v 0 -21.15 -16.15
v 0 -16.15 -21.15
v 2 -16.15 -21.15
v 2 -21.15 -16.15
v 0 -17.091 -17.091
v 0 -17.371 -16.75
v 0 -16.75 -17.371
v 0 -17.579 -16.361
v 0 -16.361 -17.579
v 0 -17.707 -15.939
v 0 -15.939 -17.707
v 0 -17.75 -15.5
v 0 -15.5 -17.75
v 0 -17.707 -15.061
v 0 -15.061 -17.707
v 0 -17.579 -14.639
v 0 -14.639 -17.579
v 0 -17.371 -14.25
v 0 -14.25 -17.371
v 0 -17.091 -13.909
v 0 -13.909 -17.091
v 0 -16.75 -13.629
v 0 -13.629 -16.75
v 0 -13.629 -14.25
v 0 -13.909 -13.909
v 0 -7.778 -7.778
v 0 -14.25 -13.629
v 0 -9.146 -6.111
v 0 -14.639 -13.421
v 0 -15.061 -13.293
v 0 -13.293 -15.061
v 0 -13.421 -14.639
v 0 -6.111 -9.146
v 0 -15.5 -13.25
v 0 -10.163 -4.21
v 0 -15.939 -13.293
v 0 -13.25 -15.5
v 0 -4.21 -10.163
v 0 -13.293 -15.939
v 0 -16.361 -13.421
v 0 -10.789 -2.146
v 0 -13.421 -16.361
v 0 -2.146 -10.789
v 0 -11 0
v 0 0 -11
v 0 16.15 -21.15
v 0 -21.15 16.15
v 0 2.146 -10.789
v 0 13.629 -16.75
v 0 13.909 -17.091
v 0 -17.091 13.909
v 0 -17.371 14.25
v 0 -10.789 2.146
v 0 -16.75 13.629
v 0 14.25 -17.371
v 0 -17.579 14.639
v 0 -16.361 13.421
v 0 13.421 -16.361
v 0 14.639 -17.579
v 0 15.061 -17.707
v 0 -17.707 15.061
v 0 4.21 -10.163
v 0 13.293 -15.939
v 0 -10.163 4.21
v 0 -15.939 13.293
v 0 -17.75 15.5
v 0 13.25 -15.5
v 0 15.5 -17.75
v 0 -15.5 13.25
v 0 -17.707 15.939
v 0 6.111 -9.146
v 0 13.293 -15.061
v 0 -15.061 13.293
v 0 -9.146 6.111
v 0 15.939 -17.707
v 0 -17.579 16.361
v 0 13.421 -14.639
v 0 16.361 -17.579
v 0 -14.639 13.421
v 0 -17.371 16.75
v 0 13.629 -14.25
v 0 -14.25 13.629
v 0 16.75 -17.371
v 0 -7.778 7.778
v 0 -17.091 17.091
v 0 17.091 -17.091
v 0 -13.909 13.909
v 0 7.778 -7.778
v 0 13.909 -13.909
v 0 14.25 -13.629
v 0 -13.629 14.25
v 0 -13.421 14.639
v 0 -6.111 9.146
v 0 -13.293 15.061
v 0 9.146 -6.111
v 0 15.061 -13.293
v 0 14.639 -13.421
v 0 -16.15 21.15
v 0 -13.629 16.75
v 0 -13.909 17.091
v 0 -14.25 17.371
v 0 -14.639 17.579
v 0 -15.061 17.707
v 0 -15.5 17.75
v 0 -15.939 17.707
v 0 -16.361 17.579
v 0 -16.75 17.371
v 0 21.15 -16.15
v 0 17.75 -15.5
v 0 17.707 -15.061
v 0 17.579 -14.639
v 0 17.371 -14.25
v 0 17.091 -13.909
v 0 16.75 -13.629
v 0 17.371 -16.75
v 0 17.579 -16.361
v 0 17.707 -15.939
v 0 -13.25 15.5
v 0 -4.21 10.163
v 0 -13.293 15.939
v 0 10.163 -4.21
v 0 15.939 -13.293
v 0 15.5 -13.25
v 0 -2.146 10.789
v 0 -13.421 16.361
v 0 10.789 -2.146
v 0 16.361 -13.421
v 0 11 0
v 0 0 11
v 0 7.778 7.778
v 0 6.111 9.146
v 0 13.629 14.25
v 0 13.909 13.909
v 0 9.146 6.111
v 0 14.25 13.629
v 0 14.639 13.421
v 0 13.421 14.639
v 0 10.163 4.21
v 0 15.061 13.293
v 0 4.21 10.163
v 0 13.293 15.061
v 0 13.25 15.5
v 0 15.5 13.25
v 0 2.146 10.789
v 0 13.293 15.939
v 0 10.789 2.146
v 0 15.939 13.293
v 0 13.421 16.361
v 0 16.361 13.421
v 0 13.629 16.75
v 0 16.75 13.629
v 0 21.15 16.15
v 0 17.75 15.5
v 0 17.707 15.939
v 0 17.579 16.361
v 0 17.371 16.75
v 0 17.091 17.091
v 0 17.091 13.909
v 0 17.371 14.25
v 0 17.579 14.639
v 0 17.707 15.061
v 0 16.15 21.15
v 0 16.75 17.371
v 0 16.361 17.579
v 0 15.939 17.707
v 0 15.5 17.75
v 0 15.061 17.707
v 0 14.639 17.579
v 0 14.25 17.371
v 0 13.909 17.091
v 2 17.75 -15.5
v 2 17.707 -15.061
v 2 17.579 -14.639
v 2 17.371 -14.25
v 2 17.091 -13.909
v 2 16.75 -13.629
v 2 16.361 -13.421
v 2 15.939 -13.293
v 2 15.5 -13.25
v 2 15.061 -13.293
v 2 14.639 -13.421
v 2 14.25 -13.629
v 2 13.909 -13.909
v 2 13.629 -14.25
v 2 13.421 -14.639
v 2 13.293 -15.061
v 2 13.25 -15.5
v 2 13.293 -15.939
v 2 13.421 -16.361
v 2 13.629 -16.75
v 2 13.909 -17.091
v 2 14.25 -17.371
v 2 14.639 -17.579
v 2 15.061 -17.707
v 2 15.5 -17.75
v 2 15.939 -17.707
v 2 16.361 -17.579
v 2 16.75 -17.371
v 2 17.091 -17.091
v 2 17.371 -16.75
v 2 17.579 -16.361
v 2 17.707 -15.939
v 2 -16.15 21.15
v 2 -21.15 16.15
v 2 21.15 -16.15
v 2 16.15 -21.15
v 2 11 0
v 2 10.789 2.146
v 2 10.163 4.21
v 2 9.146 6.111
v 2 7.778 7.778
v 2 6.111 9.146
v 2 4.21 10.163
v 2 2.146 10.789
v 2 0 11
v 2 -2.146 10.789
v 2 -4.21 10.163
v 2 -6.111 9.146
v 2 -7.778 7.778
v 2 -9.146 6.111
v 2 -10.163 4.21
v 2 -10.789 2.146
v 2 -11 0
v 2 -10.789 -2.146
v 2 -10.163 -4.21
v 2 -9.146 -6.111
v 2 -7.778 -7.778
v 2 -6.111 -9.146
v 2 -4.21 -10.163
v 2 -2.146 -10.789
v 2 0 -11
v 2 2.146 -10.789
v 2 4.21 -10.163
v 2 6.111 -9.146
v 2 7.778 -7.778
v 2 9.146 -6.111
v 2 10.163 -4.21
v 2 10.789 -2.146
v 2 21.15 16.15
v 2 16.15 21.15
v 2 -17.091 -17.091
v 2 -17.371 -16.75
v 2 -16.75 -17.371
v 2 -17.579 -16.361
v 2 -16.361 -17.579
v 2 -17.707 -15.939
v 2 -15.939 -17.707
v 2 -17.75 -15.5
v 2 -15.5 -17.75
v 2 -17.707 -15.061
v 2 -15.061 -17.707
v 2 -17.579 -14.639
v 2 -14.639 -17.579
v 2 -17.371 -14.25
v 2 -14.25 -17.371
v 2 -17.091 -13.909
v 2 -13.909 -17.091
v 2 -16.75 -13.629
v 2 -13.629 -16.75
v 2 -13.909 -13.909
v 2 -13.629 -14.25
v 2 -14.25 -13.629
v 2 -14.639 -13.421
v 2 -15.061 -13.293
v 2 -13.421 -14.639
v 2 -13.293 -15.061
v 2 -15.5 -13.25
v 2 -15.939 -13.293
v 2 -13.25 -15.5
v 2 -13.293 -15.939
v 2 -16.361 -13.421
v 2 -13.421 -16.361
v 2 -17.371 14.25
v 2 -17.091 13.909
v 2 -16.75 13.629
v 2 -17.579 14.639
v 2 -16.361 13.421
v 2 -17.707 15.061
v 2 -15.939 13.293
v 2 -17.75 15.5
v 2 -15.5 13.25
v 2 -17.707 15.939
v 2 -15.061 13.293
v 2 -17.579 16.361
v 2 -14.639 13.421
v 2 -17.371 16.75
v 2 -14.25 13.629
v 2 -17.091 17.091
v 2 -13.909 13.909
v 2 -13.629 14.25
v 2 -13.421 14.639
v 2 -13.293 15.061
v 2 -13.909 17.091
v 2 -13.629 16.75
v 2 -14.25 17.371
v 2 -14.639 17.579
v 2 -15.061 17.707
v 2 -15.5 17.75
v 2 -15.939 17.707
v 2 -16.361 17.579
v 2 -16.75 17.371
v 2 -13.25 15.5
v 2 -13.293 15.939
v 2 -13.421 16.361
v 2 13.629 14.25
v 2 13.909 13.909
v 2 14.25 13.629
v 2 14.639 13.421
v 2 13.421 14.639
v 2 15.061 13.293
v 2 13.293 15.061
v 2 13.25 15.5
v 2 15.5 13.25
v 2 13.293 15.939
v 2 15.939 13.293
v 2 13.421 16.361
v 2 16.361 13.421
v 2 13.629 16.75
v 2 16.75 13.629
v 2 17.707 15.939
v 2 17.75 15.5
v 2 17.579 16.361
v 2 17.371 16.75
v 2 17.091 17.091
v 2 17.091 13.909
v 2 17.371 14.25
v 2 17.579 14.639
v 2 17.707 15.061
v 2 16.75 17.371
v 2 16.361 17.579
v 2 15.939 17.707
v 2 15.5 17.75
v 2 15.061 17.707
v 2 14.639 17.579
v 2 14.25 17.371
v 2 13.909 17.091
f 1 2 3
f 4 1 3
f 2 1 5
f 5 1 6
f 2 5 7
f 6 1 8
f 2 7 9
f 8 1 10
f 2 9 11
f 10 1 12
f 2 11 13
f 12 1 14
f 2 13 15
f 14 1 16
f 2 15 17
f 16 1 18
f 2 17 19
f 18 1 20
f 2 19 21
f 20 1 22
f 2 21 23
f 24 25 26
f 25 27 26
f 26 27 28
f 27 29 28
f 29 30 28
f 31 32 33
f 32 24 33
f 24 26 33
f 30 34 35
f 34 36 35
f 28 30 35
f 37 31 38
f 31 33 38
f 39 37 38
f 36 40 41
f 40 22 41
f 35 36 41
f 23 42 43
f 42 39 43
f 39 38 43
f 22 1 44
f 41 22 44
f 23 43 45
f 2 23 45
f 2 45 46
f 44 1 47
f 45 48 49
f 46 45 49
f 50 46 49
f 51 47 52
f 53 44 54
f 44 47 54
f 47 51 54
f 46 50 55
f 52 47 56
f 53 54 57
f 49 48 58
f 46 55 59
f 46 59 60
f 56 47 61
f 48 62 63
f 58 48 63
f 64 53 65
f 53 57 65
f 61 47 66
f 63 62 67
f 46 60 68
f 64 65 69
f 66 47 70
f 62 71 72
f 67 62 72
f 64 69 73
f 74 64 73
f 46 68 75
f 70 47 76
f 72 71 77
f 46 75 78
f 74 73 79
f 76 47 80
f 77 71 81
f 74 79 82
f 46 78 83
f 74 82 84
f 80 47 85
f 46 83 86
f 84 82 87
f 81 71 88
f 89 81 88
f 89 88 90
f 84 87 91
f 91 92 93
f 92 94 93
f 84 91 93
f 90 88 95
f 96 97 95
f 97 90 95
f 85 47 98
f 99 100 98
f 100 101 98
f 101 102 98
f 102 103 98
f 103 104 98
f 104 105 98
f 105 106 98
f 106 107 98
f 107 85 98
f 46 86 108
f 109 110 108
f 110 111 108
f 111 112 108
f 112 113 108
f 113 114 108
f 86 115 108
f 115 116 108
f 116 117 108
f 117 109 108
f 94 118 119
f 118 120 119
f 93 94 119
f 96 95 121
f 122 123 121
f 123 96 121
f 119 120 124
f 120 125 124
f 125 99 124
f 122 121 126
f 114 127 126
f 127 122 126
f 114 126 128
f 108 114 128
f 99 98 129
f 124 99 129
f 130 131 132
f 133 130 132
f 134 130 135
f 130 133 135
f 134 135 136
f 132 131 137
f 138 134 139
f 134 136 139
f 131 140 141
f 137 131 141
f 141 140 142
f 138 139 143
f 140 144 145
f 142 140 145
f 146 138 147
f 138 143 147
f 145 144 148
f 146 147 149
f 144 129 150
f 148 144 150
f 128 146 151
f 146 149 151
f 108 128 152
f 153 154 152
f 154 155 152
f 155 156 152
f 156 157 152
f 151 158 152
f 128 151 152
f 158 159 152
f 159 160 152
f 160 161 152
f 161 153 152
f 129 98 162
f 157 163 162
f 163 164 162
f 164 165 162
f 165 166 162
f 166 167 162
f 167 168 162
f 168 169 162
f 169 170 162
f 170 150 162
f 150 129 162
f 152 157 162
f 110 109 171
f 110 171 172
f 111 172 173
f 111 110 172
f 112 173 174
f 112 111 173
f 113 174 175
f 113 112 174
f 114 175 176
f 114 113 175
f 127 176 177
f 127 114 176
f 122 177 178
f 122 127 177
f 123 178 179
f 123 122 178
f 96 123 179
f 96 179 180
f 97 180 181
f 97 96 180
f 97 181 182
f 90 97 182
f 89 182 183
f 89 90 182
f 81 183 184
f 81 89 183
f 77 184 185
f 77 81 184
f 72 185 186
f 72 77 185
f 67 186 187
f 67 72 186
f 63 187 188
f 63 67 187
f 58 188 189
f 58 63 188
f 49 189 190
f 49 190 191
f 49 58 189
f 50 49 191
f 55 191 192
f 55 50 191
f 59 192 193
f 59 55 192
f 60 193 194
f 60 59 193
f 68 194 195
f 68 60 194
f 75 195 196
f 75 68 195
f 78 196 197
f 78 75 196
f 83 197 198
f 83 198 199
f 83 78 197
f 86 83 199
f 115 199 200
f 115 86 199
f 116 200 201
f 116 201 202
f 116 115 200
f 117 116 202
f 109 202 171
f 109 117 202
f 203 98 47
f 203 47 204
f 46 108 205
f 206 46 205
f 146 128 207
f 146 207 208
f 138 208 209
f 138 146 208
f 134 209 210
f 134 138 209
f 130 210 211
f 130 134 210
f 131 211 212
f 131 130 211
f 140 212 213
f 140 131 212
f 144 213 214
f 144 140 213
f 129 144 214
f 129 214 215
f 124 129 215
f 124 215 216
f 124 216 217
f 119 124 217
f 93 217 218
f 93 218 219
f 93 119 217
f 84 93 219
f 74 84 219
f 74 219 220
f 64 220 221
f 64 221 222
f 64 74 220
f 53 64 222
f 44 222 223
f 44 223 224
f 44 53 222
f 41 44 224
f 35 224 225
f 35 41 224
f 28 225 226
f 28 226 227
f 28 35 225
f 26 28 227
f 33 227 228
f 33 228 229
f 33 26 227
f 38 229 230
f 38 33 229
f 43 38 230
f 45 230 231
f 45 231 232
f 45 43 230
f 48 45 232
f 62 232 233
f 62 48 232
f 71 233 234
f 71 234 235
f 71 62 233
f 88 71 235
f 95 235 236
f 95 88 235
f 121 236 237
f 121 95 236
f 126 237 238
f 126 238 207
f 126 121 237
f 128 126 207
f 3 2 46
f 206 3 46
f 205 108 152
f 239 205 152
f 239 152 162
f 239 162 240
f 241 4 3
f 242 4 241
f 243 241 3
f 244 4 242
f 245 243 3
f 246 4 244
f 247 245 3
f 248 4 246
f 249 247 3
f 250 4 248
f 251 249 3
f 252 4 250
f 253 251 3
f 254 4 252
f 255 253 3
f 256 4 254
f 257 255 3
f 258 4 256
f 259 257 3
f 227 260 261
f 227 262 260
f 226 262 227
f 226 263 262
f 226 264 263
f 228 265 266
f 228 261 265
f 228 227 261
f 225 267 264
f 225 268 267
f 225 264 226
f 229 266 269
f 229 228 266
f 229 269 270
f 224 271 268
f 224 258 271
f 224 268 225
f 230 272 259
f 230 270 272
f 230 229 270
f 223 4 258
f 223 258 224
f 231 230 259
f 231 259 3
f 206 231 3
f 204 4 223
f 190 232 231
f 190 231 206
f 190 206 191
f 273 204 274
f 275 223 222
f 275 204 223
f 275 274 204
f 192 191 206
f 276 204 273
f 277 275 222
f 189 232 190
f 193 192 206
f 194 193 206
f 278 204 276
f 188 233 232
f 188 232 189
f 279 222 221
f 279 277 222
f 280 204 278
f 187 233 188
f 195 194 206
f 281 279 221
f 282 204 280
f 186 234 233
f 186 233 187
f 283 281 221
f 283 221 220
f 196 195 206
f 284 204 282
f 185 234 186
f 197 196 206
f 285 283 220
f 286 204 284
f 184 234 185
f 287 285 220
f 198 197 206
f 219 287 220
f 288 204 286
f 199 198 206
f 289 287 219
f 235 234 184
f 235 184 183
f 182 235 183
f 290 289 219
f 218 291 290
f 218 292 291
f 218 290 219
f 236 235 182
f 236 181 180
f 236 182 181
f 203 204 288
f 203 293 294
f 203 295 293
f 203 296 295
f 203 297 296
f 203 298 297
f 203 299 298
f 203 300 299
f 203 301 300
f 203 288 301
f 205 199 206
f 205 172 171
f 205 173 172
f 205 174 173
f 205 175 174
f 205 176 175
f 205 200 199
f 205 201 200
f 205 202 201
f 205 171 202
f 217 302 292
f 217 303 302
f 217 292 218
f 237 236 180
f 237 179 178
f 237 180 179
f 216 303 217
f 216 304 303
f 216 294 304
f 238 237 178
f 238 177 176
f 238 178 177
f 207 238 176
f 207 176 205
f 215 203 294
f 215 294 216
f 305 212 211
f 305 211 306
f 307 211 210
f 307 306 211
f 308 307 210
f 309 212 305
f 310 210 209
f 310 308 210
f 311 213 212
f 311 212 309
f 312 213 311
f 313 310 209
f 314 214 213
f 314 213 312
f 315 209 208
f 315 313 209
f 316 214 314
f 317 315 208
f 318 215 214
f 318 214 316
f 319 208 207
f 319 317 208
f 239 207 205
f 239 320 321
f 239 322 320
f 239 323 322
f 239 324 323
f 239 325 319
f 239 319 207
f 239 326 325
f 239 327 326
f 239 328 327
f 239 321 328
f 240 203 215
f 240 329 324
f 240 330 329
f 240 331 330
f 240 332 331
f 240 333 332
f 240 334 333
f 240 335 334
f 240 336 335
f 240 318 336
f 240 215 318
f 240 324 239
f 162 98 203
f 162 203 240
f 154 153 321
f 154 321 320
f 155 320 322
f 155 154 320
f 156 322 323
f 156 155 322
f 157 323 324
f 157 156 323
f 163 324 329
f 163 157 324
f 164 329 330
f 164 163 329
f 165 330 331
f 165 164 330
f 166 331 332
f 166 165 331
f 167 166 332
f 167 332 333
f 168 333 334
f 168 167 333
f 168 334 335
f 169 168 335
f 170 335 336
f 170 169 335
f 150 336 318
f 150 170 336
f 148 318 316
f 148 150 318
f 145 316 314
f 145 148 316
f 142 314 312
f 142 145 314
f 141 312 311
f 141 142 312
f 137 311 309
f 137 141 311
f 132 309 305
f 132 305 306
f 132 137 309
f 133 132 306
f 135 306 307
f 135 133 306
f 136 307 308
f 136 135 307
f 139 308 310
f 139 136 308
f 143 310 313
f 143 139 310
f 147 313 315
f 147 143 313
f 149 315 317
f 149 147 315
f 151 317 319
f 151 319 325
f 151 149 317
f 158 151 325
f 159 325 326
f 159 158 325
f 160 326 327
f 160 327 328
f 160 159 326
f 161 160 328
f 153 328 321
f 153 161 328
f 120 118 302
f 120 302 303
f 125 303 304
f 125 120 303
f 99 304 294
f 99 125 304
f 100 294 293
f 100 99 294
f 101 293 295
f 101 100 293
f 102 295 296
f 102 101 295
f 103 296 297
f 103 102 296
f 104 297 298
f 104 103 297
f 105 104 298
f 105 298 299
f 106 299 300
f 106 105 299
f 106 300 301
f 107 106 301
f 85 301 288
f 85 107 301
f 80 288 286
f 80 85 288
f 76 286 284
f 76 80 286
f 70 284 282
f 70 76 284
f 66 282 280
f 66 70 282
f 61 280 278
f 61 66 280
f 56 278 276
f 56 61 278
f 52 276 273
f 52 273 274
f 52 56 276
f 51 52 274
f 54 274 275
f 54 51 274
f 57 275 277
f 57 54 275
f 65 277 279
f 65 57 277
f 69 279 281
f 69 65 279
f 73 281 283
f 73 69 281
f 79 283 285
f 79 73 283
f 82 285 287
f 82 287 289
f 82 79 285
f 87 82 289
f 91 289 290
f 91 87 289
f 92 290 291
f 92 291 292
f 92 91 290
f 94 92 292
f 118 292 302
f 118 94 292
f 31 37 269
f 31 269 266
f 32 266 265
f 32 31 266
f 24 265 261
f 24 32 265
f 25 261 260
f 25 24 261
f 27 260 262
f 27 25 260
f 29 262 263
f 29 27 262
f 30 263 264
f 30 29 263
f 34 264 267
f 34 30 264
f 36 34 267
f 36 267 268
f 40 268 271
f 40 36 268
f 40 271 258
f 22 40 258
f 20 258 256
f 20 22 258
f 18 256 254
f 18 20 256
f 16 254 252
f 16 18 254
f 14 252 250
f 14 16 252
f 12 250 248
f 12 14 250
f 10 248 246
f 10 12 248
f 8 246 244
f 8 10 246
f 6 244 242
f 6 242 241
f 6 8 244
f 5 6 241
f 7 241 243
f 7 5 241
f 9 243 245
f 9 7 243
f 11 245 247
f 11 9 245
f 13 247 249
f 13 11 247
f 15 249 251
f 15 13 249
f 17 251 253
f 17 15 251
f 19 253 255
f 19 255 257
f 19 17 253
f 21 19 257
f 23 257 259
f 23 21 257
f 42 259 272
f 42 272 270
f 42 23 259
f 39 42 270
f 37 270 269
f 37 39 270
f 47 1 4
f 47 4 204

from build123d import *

# Parameters (mm, degrees)
F0_W     = 42.3
F0_H     = 42.3
F0_R     = 2.25
F0_R_2   = 11
F1_DEPTH = 2
F2_SIZE  = 5


with BuildPart() as f1:
    # F0 (on Right) → F1 (new body)
    with BuildSketch(Plane.YZ):
        Rectangle(F0_W, F0_H)
        with Locations((-15.5, -15.5)):
            Circle(F0_R, mode=Mode.SUBTRACT)
        with Locations((15.5, -15.5)):
            Circle(F0_R, mode=Mode.SUBTRACT)
        with Locations((-15.5, 15.5)):
            Circle(F0_R, mode=Mode.SUBTRACT)
        Circle(F0_R_2, mode=Mode.SUBTRACT)
        with Locations((15.5, 15.5)):
            Circle(F0_R, mode=Mode.SUBTRACT)
    extrude(amount=F1_DEPTH)

    # F2
    f2_edges = [f1.edges().sort_by_distance(p)[0] for p in [
        (1, -21.15, 21.15),
        (1, 21.15, 21.15),
        (1, -21.15, -21.15),
        (1, 21.15, -21.15),
    ]]
    chamfer(f2_edges, length=F2_SIZE)


solid = f1.part
